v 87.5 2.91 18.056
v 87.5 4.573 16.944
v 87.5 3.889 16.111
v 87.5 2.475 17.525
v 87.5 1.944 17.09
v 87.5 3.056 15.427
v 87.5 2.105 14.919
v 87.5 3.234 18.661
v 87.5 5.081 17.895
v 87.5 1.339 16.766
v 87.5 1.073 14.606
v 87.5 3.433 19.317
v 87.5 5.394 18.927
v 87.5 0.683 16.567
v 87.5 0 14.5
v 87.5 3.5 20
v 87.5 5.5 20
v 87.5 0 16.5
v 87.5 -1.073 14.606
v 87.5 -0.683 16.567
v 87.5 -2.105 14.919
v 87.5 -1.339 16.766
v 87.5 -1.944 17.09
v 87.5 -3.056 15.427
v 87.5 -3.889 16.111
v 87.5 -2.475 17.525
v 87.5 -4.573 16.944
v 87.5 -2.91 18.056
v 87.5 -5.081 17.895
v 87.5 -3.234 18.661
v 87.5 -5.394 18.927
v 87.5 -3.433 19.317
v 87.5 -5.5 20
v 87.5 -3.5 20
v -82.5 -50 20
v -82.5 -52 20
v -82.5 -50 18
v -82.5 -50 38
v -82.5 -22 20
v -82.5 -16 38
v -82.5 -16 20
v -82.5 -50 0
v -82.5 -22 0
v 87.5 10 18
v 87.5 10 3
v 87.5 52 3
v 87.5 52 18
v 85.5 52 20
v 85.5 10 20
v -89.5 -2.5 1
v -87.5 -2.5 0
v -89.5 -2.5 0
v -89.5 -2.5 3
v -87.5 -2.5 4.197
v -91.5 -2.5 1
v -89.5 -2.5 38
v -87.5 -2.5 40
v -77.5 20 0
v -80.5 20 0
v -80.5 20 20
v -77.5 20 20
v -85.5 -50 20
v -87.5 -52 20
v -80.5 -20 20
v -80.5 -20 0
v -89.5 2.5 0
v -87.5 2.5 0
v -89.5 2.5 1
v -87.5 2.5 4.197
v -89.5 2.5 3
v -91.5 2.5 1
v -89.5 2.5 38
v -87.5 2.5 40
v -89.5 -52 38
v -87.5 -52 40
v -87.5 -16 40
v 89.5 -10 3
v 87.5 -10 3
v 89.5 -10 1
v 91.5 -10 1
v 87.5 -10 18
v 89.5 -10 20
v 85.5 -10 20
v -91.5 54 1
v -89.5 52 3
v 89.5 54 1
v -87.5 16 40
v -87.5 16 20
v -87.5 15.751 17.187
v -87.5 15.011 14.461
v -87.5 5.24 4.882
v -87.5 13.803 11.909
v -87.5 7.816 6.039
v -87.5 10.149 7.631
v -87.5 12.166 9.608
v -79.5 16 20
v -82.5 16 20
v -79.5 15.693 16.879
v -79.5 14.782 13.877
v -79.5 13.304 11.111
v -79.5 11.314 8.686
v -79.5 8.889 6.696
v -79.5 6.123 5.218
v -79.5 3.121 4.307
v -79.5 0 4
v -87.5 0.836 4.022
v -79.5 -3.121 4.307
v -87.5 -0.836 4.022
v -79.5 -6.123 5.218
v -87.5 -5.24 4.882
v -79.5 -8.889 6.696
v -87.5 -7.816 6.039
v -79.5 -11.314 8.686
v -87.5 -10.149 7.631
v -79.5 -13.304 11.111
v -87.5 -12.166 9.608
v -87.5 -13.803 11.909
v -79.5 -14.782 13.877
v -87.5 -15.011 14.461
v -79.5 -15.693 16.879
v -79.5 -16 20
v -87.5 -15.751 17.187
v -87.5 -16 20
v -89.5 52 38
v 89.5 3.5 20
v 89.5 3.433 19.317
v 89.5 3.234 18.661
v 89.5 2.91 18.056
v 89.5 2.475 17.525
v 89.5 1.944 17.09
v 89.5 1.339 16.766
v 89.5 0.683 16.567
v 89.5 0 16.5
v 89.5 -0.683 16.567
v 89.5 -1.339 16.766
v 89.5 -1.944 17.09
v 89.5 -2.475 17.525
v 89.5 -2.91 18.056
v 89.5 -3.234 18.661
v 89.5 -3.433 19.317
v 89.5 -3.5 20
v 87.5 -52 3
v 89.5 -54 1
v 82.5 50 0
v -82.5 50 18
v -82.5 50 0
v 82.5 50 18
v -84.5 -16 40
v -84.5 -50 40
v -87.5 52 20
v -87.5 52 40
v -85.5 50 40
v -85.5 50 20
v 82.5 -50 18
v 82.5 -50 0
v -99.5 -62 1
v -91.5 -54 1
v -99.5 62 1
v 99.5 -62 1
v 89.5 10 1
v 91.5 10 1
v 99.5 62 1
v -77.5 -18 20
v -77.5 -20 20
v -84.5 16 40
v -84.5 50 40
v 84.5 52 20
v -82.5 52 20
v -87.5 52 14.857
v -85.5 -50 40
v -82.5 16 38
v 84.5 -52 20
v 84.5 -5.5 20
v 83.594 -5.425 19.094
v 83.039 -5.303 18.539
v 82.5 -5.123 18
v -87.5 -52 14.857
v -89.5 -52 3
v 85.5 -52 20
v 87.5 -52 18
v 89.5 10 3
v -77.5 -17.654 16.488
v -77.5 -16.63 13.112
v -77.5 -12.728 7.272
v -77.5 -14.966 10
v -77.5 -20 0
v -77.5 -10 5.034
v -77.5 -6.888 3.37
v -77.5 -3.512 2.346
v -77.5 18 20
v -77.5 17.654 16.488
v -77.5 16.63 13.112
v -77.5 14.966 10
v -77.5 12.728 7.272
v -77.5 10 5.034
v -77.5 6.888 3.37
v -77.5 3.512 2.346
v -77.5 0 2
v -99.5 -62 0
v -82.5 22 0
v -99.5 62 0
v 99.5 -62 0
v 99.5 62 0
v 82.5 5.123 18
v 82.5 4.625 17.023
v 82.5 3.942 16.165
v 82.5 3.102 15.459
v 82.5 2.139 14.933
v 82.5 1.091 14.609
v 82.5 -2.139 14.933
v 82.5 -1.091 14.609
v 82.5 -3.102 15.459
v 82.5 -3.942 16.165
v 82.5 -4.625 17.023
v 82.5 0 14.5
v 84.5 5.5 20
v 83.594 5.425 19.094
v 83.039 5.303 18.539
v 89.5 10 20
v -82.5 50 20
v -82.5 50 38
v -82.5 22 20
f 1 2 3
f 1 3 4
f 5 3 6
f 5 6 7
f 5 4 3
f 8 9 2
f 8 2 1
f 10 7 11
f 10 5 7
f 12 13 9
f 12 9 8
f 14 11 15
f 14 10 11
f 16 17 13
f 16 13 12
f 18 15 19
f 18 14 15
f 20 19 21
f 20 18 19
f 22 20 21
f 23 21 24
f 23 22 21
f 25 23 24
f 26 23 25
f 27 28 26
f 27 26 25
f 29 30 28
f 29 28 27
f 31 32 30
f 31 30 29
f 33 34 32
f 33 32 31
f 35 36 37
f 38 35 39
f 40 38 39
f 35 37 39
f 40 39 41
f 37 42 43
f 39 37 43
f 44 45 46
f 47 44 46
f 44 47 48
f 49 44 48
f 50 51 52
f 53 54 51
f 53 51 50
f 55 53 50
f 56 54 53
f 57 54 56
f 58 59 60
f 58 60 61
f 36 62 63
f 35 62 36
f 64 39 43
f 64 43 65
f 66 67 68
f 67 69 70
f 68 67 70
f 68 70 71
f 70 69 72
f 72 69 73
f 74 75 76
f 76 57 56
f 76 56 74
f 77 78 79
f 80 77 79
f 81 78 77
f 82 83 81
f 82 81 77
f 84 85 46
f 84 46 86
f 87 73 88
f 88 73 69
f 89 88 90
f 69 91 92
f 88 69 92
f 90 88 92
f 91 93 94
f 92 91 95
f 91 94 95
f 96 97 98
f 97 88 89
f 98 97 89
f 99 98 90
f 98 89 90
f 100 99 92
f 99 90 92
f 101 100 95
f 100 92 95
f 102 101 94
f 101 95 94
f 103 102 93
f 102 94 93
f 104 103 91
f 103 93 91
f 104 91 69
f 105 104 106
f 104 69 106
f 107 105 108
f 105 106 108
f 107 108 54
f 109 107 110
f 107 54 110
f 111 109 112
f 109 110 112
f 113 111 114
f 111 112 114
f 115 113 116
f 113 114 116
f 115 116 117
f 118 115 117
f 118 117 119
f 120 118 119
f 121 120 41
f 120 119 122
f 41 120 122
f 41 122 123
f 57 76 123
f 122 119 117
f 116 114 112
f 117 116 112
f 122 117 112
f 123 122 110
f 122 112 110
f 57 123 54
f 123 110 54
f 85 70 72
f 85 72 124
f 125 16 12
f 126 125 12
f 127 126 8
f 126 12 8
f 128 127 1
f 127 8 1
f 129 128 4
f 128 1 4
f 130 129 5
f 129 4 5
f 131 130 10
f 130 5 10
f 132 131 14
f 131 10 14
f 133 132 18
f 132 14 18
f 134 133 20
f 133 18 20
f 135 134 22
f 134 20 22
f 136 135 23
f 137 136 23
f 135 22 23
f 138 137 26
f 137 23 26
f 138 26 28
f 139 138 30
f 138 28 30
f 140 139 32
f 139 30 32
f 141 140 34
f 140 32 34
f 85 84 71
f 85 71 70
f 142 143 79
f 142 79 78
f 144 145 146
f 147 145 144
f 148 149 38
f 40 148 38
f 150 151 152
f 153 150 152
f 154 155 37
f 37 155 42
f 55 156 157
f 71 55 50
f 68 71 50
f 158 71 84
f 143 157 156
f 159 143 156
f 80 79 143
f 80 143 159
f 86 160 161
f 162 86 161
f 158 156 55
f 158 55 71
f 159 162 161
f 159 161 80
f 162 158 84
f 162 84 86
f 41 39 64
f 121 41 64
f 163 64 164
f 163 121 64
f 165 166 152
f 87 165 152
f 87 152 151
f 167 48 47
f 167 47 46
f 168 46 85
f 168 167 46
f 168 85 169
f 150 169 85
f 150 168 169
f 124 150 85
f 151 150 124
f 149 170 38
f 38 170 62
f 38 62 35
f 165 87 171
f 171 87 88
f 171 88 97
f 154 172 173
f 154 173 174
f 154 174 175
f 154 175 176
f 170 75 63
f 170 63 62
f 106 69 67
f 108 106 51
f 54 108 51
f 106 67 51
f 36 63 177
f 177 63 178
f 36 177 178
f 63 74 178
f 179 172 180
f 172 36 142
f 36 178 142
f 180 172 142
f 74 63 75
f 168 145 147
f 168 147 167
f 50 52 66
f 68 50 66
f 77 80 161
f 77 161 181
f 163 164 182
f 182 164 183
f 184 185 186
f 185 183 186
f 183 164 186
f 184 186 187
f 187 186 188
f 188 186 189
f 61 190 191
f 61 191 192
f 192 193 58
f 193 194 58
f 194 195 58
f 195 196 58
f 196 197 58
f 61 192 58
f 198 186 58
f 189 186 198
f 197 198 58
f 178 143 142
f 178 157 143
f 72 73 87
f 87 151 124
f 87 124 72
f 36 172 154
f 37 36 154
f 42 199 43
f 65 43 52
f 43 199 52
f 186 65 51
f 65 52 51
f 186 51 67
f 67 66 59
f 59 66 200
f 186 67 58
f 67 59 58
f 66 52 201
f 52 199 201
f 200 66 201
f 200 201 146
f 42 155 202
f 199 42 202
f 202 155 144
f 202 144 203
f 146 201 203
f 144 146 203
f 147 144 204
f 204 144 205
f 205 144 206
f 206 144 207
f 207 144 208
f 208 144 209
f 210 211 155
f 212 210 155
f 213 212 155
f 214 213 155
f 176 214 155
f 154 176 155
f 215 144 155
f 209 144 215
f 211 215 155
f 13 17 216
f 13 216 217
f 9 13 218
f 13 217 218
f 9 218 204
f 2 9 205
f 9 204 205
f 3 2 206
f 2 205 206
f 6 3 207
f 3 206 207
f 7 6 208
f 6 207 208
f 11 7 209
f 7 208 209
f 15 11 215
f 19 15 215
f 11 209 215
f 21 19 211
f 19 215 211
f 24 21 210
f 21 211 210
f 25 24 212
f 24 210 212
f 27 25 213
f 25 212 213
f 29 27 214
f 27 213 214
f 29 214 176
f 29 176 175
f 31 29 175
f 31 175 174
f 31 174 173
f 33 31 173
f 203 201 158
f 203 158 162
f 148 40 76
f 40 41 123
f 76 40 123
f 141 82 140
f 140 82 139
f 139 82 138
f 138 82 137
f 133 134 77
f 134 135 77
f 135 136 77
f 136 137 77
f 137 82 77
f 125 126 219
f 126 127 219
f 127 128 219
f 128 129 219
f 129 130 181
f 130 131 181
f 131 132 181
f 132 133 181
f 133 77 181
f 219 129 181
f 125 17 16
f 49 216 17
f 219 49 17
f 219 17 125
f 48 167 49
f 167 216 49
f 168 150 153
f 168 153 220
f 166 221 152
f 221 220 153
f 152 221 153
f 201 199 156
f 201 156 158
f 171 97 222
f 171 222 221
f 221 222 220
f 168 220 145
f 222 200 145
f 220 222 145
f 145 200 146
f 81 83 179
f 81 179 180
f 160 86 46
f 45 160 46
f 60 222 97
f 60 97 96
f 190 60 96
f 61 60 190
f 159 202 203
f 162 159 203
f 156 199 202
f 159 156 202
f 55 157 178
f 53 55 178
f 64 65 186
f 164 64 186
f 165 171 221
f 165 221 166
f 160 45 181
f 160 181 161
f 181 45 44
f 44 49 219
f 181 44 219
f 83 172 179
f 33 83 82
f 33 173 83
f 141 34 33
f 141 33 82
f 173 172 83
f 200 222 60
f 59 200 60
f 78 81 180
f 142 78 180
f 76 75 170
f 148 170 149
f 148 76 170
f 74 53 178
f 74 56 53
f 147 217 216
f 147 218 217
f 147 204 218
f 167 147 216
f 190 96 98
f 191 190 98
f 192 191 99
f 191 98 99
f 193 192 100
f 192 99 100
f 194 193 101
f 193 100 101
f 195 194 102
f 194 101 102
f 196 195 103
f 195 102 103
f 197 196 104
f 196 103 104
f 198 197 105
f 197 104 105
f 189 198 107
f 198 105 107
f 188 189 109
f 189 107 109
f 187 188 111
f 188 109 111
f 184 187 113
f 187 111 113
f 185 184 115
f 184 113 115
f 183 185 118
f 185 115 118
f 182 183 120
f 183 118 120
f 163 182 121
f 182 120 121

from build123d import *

# Parameters (mm, degrees)
F0_W           = 5
F0_H           = 40
F0_W_2         = 2
F0_H_2         = 20
F1_DEPTH       = 20
F3_DEPTH       = 10
F4_DEPTH       = 175
F6_DEPTH       = 20
F0_H_3         = 49.5
F7_DEPTH       = 40
F8_DEPTH       = 177
F0_W_3         = 199
F0_H_4         = 124
F9_DEPTH       = 1
F10_T1_DEPTH   = 49.5
F10_T3_DEPTH   = 177
F10_T5_DEPTH   = 47.1433659759
F10_T7_DEPTH   = 47.1433659759
F10_T9_DEPTH   = 20
F10_T11_DEPTH  = 20
F10_T13_DEPTH  = 49.5
F10_T15_DEPTH  = 25.1433659759
F10_T20_DEPTH  = 59.7867319519
F10_T25_DEPTH  = 59.7867319519
F10_T31_DEPTH  = 182.1433659759
F10_T35_DEPTH  = 54.6433659759
F10_T42_DEPTH  = 182.1433659759
F10_T46_DEPTH  = 54.6433659759
F10_T53_DEPTH  = 47.1433659759
F10_T57_DEPTH  = 182.1433659759
F10_T64_DEPTH  = 182.1433659759
F10_T68_DEPTH  = 47.1433659759
F10_T71_DEPTH  = 47.1433659759
F10_T73_DEPTH  = 47.1433659759
F10_T75_DEPTH  = 49.6433659759
F10_T77_DEPTH  = 49.6433659759
F10_T79_DEPTH  = 165
F10_T81_DEPTH  = 44.2867319519
F10_T83_DEPTH  = 44.2867319519
F10_T85_DEPTH  = 59.7867319519
F10_T87_DEPTH  = 59.7867319519
F10_T90_ANGLE  = 216.895885655
F10_T95_DEPTH  = 54.7867319519
F10_T100_DEPTH = 170.1433659759
F10_T108_DEPTH = 170.1433659759
F10_T113_DEPTH = 54.7867319519


# Not quite as in the source:
# - a fillet or chamfer that OpenCascade refuses, or shapes differently, is made with other operations: its cross-section is extruded or revolved along the edge and cut away or added


with BuildPart() as f1:
    # F0 (on Top) → F1 (new body)
    with BuildSketch(Plane.XY):
        Polygon((87.5, 52), (-87.5, 52), (-87.5, 2.5), (-87.5, -2.5), (-87.5, -52), (87.5, -52), (87.5, -10), (87.5, 10), align=None)
        Polygon((-82.5, 20), (-82.5, 50), (82.5, 50), (82.5, -50), (-82.5, -50), (-82.5, -20), align=None, mode=Mode.SUBTRACT)
        with Locations((-80, 0)):
            Rectangle(F0_W, F0_H)
        with Locations((88.5, 0)):
            Rectangle(F0_W_2, F0_H_2)
    extrude(amount=F1_DEPTH)

    # F2 (on face) → F3 (cut, through all)
    with BuildSketch(Plane(origin=(-87.5, 0, 0), x_dir=(0, -1, 0), z_dir=(-1, 0, 0))):
        with BuildLine():
            ThreePointArc((-16, 20), (0, 4), (16, 20))
            Line((16, 20), (5.5, 20))
            ThreePointArc((5.5, 20), (0, 14.5), (-5.5, 20))
            Line((-5.5, 20), (-16, 20))
        make_face()
        with BuildLine():
            ThreePointArc((-5.5, 20), (0, 14.5), (5.5, 20))
            Line((5.5, 20), (3.5, 20))
            ThreePointArc((3.5, 20), (0, 16.5), (-3.5, 20))
            Line((-3.5, 20), (-5.5, 20))
        make_face()
    extrude(amount=-F3_DEPTH, mode=Mode.SUBTRACT)

    # F2 (on face) → F4 (cut, through all)
    with BuildSketch(Plane(origin=(-87.5, 0, 0), x_dir=(0, -1, 0), z_dir=(-1, 0, 0))):
        with BuildLine():
            ThreePointArc((-5.5, 20), (0, 14.5), (5.5, 20))
            Line((5.5, 20), (3.5, 20))
            ThreePointArc((3.5, 20), (0, 16.5), (-3.5, 20))
            Line((-3.5, 20), (-5.5, 20))
        make_face()
        with BuildLine():
            ThreePointArc((-3.5, 20), (0, 16.5), (3.5, 20))
            Line((3.5, 20), (-3.5, 20))
        make_face()
    extrude(amount=-F4_DEPTH, mode=Mode.SUBTRACT)

    # F5 (on face) → F6 (join)
    with BuildSketch(Plane.XY.offset(20)):
        Polygon((-82.5, 20), (-82.5, 50), (-87.5, 50), (-87.5, 16), (-82.5, 16), align=None)
        Polygon((-82.5, -16), (-87.5, -16), (-87.5, -50), (-82.5, -50), (-82.5, -20), align=None)
    extrude(amount=F6_DEPTH)

    # F0 (on Top) → F7 (join, through all)
    with BuildSketch(Plane.XY):
        with Locations((-88.5, 27.25)):
            Rectangle(F0_W_2, F0_H_3)
        with Locations((-88.5, -27.25)):
            Rectangle(F0_W_2, F0_H_3)
    extrude(amount=F7_DEPTH)

    # F2 (on face) → F8 (cut, through all)
    with BuildSketch(Plane(origin=(-87.5, 0, 0), x_dir=(0, -1, 0), z_dir=(-1, 0, 0))):
        with BuildLine():
            ThreePointArc((-3.5, 20), (0, 16.5), (3.5, 20))
            Line((3.5, 20), (-3.5, 20))
        make_face()
        with BuildLine():
            Line((-3.5, 20), (3.5, 20))
            ThreePointArc((3.5, 20), (0, 23.5), (-3.5, 20))
        make_face()
    extrude(amount=-F8_DEPTH, mode=Mode.SUBTRACT)

    # F0 (on Top) → F9 (join)
    with BuildSketch(Plane.XY):
        Rectangle(F0_W_3, F0_H_4)
        Polygon((-89.5, 52), (-87.5, 52), (87.5, 52), (87.5, 10), (89.5, 10), (89.5, -10), (87.5, -10), (87.5, -52), (-87.5, -52), (-89.5, -52), (-89.5, -2.5), (-89.5, 2.5), align=None, mode=Mode.SUBTRACT)
    extrude(amount=F9_DEPTH)

    # F10: chamfer of 2 on 23 edges, made by hand

    # F10_s2 → F10_t1 (join)
    with BuildSketch(Plane.XZ.offset(-52)):
        Polygon((-91.5, 1), (-89.5, 3), (-89.5, 1), align=None)
    extrude(amount=F10_T1_DEPTH)

    # F10_s4 → F10_t3 (join)
    with BuildSketch(Plane.YZ.offset(-89.5)):
        Polygon((-54, 1), (-52, 3), (-52, 1), align=None)
        Polygon((52, 3), (54, 1), (52, 1), align=None)
    extrude(amount=F10_T3_DEPTH)

    # F10_s6 → F10_t5 (join)
    with BuildSketch(Plane.XZ.offset(-52)):
        Polygon((89.5, 1), (87.5, 3), (87.5, 1), align=None)
    extrude(amount=F10_T5_DEPTH)

    # F10_s8 → F10_t7 (join)
    with BuildSketch(Plane.XZ.offset(4.8566340241)):
        Polygon((89.5, 1), (87.5, 3), (87.5, 1), align=None)
    extrude(amount=F10_T7_DEPTH)

    # F10_s10 → F10_t9 (join)
    with BuildSketch(Plane.XZ.offset(-10)):
        Polygon((91.5, 1), (89.5, 3), (89.5, 1), align=None)
    extrude(amount=F10_T9_DEPTH)

    # F10_s12 → F10_t11 (join)
    with BuildSketch(Plane.XY):
        Polygon((-82.5, -22), (-80.5, -20), (-82.5, -20), align=None)
        Polygon((-82.5, 22), (-80.5, 20), (-82.5, 20), align=None)
    extrude(amount=F10_T11_DEPTH)

    # F10_s14 → F10_t13 (join)
    with BuildSketch(Plane.XZ.offset(2.5)):
        Polygon((-91.5, 1), (-89.5, 3), (-89.5, 1), align=None)
    extrude(amount=F10_T13_DEPTH)

    # F10_s16 → F10_t15 (join)
    with BuildSketch(Plane.XY.offset(14.8566340241)):
        Polygon((-87.5, 52), (-85.5, 50), (-87.5, 50), align=None)
        Polygon((-87.5, -52), (-85.5, -50), (-87.5, -50), align=None)
    extrude(amount=F10_T15_DEPTH)


with BuildPart() as f10_tool18:
    # F10_s19 → F10_t20 (new body)
    with BuildSketch(Plane.XZ.offset(-57.1433659759)):
        Polygon((-91.5, 1), (-89.5, 3), (-89.5, 1), align=None)
    extrude(amount=F10_T20_DEPTH)

    split(bisect_by=Plane.XZ.offset(2.5), keep=Keep.TOP)


with BuildPart() as f1_1:
    add(f1.part)

    # F10_t17: union F10_tool18
    add(f10_tool18.part)


with BuildPart() as f10_tool23:
    # F10_s24 → F10_t25 (new body)
    with BuildSketch(Plane.XZ.offset(-2.6433659759)):
        Polygon((-91.5, 1), (-89.5, 3), (-89.5, 1), align=None)
    extrude(amount=F10_T25_DEPTH)

    split(bisect_by=Plane.XZ.offset(-2.5), keep=Keep.BOTTOM)


with BuildPart() as f1_2:
    add(f1_1.part)

    # F10_t22: union F10_tool23
    add(f10_tool23.part)


with BuildPart() as f10_tool29:
    # F10_s30 → F10_t31 (new body)
    with BuildSketch(Plane.YZ.offset(87.5)):
        Polygon((52, 3), (54, 1), (52, 1), align=None)
    extrude(amount=-F10_T31_DEPTH)

    split(bisect_by=Plane.YZ.offset(-89.5), keep=Keep.BOTTOM)


with BuildPart() as f10_tool33:
    # F10_s34 → F10_t35 (new body)
    with BuildSketch(Plane.XZ.offset(-57.1433659759)):
        Polygon((-91.5, 1), (-89.5, 3), (-89.5, 1), align=None)
    extrude(amount=F10_T35_DEPTH)

    split(bisect_by=Plane.XZ.offset(-52), keep=Keep.BOTTOM)


with BuildPart() as f10_tool29_1:
    add(f10_tool29.part)

    # F10_t37: intersect F10_tool33
    add(f10_tool33.part, mode=Mode.INTERSECT)


with BuildPart() as f1_3:
    add(f1_2.part)

    # F10_t27: union F10_tool29
    add(f10_tool29_1.part)


with BuildPart() as f10_tool40:
    # F10_s41 → F10_t42 (new body)
    with BuildSketch(Plane.YZ.offset(-94.6433659759)):
        Polygon((-54, 1), (-52, 3), (-52, 1), align=None)
    extrude(amount=F10_T42_DEPTH)

    split(bisect_by=Plane.YZ.offset(-89.5), keep=Keep.BOTTOM)


with BuildPart() as f10_tool44:
    # F10_s45 → F10_t46 (new body)
    with BuildSketch(Plane.XZ.offset(2.5)):
        Polygon((-91.5, 1), (-89.5, 3), (-89.5, 1), align=None)
    extrude(amount=F10_T46_DEPTH)

    split(bisect_by=Plane.XZ.offset(52), keep=Keep.TOP)


with BuildPart() as f10_tool40_1:
    add(f10_tool40.part)

    # F10_t48: intersect F10_tool44
    add(f10_tool44.part, mode=Mode.INTERSECT)


with BuildPart() as f1_4:
    add(f1_3.part)

    # F10_t38: union F10_tool40
    add(f10_tool40_1.part)


with BuildPart() as f10_tool51:
    # F10_s52 → F10_t53 (new body)
    with BuildSketch(Plane.XZ.offset(10)):
        Polygon((89.5, 1), (87.5, 3), (87.5, 1), align=None)
    extrude(amount=F10_T53_DEPTH)

    split(bisect_by=Plane.XZ.offset(52), keep=Keep.TOP)


with BuildPart() as f10_tool55:
    # F10_s56 → F10_t57 (new body)
    with BuildSketch(Plane.YZ.offset(-89.5)):
        Polygon((-54, 1), (-52, 3), (-52, 1), align=None)
    extrude(amount=F10_T57_DEPTH)

    split(bisect_by=Plane.YZ.offset(87.5), keep=Keep.TOP)


with BuildPart() as f10_tool51_1:
    add(f10_tool51.part)

    # F10_t59: intersect F10_tool55
    add(f10_tool55.part, mode=Mode.INTERSECT)


with BuildPart() as f1_5:
    add(f1_4.part)

    # F10_t49: union F10_tool51
    add(f10_tool51_1.part)


with BuildPart() as f10_tool62:
    # F10_s63 → F10_t64 (new body)
    with BuildSketch(Plane.YZ.offset(92.6433659759)):
        Polygon((52, 3), (54, 1), (52, 1), align=None)
    extrude(amount=-F10_T64_DEPTH)

    split(bisect_by=Plane.YZ.offset(87.5), keep=Keep.TOP)


with BuildPart() as f10_tool66:
    # F10_s67 → F10_t68 (new body)
    with BuildSketch(Plane.XZ.offset(-57.1433659759)):
        Polygon((89.5, 1), (87.5, 3), (87.5, 1), align=None)
    extrude(amount=F10_T68_DEPTH)

    split(bisect_by=Plane.XZ.offset(-52), keep=Keep.BOTTOM)


with BuildPart() as f10_tool62_1:
    add(f10_tool62.part)

    # F10_t70: intersect F10_tool66
    add(f10_tool66.part, mode=Mode.INTERSECT)


with BuildPart() as f1_6:
    add(f1_5.part)

    # F10_t60: union F10_tool62
    add(f10_tool62_1.part)

    # F10_s72 → F10_t71 (cut)
    with BuildSketch(Plane.XZ.offset(10)):
        Polygon((85.5, 20), (87.5, 18), (87.5, 20), align=None)
    extrude(amount=F10_T71_DEPTH, mode=Mode.SUBTRACT)

    # F10_s74 → F10_t73 (cut)
    with BuildSketch(Plane.XZ.offset(-57.1433659759)):
        Polygon((87.5, 18), (85.5, 20), (87.5, 20), align=None)
    extrude(amount=F10_T73_DEPTH, mode=Mode.SUBTRACT)

    # F10_s76 → F10_t75 (cut)
    with BuildSketch(Plane.XZ.offset(-50)):
        Polygon((82.5, 18), (84.5, 20), (82.5, 20), align=None)
    extrude(amount=F10_T75_DEPTH, mode=Mode.SUBTRACT)

    # F10_s78 → F10_t77 (cut)
    with BuildSketch(Plane.XZ.offset(0.3566340241)):
        Polygon((84.5, 20), (82.5, 18), (82.5, 20), align=None)
    extrude(amount=F10_T77_DEPTH, mode=Mode.SUBTRACT)

    # F10_s80 → F10_t79 (cut)
    with BuildSketch(Plane.YZ.offset(-82.5)):
        Polygon((50, 18), (52, 20), (50, 20), align=None)
        Polygon((-52, 20), (-50, 18), (-50, 20), align=None)
    extrude(amount=F10_T79_DEPTH, mode=Mode.SUBTRACT)

    # F10_s82 → F10_t81 (cut)
    with BuildSketch(Plane.XZ.offset(10.8566340241)):
        Polygon((-84.5, 40), (-82.5, 38), (-82.5, 40), align=None)
    extrude(amount=F10_T81_DEPTH, mode=Mode.SUBTRACT)

    # F10_s84 → F10_t83 (cut)
    with BuildSketch(Plane.XZ.offset(-55.1433659759)):
        Polygon((-82.5, 38), (-84.5, 40), (-82.5, 40), align=None)
    extrude(amount=F10_T83_DEPTH, mode=Mode.SUBTRACT)

    # F10_s86 → F10_t85 (cut)
    with BuildSketch(Plane.XZ.offset(-2.6433659759)):
        Polygon((-87.5, 40), (-89.5, 38), (-89.5, 40), align=None)
    extrude(amount=F10_T85_DEPTH, mode=Mode.SUBTRACT)

    # F10_s88 → F10_t87 (cut)
    with BuildSketch(Plane.XZ.offset(-57.1433659759)):
        Polygon((-87.5, 40), (-89.5, 38), (-89.5, 40), align=None)
    extrude(amount=F10_T87_DEPTH, mode=Mode.SUBTRACT)

    # F10_s89 → F10_t90 (revolve, cut)
    with BuildSketch(Plane(origin=(0, -6.0036279933, 17.9972777192), x_dir=(1, 0, 0), z_dir=(0, -0.316442908, 0.9486115569))):
        Polygon((-77.5, 24.3288581605), (-79.5, 22.3288581605), (-77.5, 22.3288581605), align=None)
    revolve(axis=Axis((-77.5, 0, 20), (-1, 0, 0)), revolution_arc=F10_T90_ANGLE, mode=Mode.SUBTRACT)


with BuildPart() as f10_tool93:
    # F10_s94 → F10_t95 (new body)
    with BuildSketch(Plane.XZ.offset(-55.1433659759)):
        Polygon((82.5, 18), (84.5, 20), (82.5, 20), align=None)
    extrude(amount=F10_T95_DEPTH)

    split(bisect_by=Plane.XZ.offset(-52), keep=Keep.TOP)

    split(bisect_by=Plane.XZ.offset(-50), keep=Keep.BOTTOM)


with BuildPart() as f10_tool98:
    # F10_s99 → F10_t100 (new body)
    with BuildSketch(Plane.YZ.offset(-82.5)):
        Polygon((50, 18), (52, 20), (50, 20), align=None)
    extrude(amount=F10_T100_DEPTH)

    split(bisect_by=Plane.YZ.offset(87.5), keep=Keep.BOTTOM)

    split(bisect_by=Plane.YZ.offset(82.5), keep=Keep.TOP)


with BuildPart() as f10_tool93_1:
    add(f10_tool93.part)

    # F10_t103: intersect F10_tool98
    add(f10_tool98.part, mode=Mode.INTERSECT)


with BuildPart() as f1_7:
    add(f1_6.part)

    # F10_t91: cut F10_tool93
    add(f10_tool93_1.part, mode=Mode.SUBTRACT)


with BuildPart() as f10_tool106:
    # F10_s107 → F10_t108 (new body)
    with BuildSketch(Plane.YZ.offset(87.6433659759)):
        Polygon((-52, 20), (-50, 18), (-50, 20), align=None)
    extrude(amount=-F10_T108_DEPTH)

    split(bisect_by=Plane.YZ.offset(87.5), keep=Keep.BOTTOM)

    split(bisect_by=Plane.YZ.offset(82.5), keep=Keep.TOP)


with BuildPart() as f10_tool111:
    # F10_s112 → F10_t113 (new body)
    with BuildSketch(Plane.XZ.offset(0.3566340241)):
        Polygon((84.5, 20), (82.5, 18), (82.5, 20), align=None)
    extrude(amount=F10_T113_DEPTH)

    split(bisect_by=Plane.XZ.offset(52), keep=Keep.BOTTOM)

    split(bisect_by=Plane.XZ.offset(50), keep=Keep.TOP)


with BuildPart() as f10_tool106_1:
    add(f10_tool106.part)

    # F10_t116: intersect F10_tool111
    add(f10_tool111.part, mode=Mode.INTERSECT)


with BuildPart() as f1_8:
    add(f1_7.part)

    # F10_t104: cut F10_tool106
    add(f10_tool106_1.part, mode=Mode.SUBTRACT)


solid = f1_8.part
